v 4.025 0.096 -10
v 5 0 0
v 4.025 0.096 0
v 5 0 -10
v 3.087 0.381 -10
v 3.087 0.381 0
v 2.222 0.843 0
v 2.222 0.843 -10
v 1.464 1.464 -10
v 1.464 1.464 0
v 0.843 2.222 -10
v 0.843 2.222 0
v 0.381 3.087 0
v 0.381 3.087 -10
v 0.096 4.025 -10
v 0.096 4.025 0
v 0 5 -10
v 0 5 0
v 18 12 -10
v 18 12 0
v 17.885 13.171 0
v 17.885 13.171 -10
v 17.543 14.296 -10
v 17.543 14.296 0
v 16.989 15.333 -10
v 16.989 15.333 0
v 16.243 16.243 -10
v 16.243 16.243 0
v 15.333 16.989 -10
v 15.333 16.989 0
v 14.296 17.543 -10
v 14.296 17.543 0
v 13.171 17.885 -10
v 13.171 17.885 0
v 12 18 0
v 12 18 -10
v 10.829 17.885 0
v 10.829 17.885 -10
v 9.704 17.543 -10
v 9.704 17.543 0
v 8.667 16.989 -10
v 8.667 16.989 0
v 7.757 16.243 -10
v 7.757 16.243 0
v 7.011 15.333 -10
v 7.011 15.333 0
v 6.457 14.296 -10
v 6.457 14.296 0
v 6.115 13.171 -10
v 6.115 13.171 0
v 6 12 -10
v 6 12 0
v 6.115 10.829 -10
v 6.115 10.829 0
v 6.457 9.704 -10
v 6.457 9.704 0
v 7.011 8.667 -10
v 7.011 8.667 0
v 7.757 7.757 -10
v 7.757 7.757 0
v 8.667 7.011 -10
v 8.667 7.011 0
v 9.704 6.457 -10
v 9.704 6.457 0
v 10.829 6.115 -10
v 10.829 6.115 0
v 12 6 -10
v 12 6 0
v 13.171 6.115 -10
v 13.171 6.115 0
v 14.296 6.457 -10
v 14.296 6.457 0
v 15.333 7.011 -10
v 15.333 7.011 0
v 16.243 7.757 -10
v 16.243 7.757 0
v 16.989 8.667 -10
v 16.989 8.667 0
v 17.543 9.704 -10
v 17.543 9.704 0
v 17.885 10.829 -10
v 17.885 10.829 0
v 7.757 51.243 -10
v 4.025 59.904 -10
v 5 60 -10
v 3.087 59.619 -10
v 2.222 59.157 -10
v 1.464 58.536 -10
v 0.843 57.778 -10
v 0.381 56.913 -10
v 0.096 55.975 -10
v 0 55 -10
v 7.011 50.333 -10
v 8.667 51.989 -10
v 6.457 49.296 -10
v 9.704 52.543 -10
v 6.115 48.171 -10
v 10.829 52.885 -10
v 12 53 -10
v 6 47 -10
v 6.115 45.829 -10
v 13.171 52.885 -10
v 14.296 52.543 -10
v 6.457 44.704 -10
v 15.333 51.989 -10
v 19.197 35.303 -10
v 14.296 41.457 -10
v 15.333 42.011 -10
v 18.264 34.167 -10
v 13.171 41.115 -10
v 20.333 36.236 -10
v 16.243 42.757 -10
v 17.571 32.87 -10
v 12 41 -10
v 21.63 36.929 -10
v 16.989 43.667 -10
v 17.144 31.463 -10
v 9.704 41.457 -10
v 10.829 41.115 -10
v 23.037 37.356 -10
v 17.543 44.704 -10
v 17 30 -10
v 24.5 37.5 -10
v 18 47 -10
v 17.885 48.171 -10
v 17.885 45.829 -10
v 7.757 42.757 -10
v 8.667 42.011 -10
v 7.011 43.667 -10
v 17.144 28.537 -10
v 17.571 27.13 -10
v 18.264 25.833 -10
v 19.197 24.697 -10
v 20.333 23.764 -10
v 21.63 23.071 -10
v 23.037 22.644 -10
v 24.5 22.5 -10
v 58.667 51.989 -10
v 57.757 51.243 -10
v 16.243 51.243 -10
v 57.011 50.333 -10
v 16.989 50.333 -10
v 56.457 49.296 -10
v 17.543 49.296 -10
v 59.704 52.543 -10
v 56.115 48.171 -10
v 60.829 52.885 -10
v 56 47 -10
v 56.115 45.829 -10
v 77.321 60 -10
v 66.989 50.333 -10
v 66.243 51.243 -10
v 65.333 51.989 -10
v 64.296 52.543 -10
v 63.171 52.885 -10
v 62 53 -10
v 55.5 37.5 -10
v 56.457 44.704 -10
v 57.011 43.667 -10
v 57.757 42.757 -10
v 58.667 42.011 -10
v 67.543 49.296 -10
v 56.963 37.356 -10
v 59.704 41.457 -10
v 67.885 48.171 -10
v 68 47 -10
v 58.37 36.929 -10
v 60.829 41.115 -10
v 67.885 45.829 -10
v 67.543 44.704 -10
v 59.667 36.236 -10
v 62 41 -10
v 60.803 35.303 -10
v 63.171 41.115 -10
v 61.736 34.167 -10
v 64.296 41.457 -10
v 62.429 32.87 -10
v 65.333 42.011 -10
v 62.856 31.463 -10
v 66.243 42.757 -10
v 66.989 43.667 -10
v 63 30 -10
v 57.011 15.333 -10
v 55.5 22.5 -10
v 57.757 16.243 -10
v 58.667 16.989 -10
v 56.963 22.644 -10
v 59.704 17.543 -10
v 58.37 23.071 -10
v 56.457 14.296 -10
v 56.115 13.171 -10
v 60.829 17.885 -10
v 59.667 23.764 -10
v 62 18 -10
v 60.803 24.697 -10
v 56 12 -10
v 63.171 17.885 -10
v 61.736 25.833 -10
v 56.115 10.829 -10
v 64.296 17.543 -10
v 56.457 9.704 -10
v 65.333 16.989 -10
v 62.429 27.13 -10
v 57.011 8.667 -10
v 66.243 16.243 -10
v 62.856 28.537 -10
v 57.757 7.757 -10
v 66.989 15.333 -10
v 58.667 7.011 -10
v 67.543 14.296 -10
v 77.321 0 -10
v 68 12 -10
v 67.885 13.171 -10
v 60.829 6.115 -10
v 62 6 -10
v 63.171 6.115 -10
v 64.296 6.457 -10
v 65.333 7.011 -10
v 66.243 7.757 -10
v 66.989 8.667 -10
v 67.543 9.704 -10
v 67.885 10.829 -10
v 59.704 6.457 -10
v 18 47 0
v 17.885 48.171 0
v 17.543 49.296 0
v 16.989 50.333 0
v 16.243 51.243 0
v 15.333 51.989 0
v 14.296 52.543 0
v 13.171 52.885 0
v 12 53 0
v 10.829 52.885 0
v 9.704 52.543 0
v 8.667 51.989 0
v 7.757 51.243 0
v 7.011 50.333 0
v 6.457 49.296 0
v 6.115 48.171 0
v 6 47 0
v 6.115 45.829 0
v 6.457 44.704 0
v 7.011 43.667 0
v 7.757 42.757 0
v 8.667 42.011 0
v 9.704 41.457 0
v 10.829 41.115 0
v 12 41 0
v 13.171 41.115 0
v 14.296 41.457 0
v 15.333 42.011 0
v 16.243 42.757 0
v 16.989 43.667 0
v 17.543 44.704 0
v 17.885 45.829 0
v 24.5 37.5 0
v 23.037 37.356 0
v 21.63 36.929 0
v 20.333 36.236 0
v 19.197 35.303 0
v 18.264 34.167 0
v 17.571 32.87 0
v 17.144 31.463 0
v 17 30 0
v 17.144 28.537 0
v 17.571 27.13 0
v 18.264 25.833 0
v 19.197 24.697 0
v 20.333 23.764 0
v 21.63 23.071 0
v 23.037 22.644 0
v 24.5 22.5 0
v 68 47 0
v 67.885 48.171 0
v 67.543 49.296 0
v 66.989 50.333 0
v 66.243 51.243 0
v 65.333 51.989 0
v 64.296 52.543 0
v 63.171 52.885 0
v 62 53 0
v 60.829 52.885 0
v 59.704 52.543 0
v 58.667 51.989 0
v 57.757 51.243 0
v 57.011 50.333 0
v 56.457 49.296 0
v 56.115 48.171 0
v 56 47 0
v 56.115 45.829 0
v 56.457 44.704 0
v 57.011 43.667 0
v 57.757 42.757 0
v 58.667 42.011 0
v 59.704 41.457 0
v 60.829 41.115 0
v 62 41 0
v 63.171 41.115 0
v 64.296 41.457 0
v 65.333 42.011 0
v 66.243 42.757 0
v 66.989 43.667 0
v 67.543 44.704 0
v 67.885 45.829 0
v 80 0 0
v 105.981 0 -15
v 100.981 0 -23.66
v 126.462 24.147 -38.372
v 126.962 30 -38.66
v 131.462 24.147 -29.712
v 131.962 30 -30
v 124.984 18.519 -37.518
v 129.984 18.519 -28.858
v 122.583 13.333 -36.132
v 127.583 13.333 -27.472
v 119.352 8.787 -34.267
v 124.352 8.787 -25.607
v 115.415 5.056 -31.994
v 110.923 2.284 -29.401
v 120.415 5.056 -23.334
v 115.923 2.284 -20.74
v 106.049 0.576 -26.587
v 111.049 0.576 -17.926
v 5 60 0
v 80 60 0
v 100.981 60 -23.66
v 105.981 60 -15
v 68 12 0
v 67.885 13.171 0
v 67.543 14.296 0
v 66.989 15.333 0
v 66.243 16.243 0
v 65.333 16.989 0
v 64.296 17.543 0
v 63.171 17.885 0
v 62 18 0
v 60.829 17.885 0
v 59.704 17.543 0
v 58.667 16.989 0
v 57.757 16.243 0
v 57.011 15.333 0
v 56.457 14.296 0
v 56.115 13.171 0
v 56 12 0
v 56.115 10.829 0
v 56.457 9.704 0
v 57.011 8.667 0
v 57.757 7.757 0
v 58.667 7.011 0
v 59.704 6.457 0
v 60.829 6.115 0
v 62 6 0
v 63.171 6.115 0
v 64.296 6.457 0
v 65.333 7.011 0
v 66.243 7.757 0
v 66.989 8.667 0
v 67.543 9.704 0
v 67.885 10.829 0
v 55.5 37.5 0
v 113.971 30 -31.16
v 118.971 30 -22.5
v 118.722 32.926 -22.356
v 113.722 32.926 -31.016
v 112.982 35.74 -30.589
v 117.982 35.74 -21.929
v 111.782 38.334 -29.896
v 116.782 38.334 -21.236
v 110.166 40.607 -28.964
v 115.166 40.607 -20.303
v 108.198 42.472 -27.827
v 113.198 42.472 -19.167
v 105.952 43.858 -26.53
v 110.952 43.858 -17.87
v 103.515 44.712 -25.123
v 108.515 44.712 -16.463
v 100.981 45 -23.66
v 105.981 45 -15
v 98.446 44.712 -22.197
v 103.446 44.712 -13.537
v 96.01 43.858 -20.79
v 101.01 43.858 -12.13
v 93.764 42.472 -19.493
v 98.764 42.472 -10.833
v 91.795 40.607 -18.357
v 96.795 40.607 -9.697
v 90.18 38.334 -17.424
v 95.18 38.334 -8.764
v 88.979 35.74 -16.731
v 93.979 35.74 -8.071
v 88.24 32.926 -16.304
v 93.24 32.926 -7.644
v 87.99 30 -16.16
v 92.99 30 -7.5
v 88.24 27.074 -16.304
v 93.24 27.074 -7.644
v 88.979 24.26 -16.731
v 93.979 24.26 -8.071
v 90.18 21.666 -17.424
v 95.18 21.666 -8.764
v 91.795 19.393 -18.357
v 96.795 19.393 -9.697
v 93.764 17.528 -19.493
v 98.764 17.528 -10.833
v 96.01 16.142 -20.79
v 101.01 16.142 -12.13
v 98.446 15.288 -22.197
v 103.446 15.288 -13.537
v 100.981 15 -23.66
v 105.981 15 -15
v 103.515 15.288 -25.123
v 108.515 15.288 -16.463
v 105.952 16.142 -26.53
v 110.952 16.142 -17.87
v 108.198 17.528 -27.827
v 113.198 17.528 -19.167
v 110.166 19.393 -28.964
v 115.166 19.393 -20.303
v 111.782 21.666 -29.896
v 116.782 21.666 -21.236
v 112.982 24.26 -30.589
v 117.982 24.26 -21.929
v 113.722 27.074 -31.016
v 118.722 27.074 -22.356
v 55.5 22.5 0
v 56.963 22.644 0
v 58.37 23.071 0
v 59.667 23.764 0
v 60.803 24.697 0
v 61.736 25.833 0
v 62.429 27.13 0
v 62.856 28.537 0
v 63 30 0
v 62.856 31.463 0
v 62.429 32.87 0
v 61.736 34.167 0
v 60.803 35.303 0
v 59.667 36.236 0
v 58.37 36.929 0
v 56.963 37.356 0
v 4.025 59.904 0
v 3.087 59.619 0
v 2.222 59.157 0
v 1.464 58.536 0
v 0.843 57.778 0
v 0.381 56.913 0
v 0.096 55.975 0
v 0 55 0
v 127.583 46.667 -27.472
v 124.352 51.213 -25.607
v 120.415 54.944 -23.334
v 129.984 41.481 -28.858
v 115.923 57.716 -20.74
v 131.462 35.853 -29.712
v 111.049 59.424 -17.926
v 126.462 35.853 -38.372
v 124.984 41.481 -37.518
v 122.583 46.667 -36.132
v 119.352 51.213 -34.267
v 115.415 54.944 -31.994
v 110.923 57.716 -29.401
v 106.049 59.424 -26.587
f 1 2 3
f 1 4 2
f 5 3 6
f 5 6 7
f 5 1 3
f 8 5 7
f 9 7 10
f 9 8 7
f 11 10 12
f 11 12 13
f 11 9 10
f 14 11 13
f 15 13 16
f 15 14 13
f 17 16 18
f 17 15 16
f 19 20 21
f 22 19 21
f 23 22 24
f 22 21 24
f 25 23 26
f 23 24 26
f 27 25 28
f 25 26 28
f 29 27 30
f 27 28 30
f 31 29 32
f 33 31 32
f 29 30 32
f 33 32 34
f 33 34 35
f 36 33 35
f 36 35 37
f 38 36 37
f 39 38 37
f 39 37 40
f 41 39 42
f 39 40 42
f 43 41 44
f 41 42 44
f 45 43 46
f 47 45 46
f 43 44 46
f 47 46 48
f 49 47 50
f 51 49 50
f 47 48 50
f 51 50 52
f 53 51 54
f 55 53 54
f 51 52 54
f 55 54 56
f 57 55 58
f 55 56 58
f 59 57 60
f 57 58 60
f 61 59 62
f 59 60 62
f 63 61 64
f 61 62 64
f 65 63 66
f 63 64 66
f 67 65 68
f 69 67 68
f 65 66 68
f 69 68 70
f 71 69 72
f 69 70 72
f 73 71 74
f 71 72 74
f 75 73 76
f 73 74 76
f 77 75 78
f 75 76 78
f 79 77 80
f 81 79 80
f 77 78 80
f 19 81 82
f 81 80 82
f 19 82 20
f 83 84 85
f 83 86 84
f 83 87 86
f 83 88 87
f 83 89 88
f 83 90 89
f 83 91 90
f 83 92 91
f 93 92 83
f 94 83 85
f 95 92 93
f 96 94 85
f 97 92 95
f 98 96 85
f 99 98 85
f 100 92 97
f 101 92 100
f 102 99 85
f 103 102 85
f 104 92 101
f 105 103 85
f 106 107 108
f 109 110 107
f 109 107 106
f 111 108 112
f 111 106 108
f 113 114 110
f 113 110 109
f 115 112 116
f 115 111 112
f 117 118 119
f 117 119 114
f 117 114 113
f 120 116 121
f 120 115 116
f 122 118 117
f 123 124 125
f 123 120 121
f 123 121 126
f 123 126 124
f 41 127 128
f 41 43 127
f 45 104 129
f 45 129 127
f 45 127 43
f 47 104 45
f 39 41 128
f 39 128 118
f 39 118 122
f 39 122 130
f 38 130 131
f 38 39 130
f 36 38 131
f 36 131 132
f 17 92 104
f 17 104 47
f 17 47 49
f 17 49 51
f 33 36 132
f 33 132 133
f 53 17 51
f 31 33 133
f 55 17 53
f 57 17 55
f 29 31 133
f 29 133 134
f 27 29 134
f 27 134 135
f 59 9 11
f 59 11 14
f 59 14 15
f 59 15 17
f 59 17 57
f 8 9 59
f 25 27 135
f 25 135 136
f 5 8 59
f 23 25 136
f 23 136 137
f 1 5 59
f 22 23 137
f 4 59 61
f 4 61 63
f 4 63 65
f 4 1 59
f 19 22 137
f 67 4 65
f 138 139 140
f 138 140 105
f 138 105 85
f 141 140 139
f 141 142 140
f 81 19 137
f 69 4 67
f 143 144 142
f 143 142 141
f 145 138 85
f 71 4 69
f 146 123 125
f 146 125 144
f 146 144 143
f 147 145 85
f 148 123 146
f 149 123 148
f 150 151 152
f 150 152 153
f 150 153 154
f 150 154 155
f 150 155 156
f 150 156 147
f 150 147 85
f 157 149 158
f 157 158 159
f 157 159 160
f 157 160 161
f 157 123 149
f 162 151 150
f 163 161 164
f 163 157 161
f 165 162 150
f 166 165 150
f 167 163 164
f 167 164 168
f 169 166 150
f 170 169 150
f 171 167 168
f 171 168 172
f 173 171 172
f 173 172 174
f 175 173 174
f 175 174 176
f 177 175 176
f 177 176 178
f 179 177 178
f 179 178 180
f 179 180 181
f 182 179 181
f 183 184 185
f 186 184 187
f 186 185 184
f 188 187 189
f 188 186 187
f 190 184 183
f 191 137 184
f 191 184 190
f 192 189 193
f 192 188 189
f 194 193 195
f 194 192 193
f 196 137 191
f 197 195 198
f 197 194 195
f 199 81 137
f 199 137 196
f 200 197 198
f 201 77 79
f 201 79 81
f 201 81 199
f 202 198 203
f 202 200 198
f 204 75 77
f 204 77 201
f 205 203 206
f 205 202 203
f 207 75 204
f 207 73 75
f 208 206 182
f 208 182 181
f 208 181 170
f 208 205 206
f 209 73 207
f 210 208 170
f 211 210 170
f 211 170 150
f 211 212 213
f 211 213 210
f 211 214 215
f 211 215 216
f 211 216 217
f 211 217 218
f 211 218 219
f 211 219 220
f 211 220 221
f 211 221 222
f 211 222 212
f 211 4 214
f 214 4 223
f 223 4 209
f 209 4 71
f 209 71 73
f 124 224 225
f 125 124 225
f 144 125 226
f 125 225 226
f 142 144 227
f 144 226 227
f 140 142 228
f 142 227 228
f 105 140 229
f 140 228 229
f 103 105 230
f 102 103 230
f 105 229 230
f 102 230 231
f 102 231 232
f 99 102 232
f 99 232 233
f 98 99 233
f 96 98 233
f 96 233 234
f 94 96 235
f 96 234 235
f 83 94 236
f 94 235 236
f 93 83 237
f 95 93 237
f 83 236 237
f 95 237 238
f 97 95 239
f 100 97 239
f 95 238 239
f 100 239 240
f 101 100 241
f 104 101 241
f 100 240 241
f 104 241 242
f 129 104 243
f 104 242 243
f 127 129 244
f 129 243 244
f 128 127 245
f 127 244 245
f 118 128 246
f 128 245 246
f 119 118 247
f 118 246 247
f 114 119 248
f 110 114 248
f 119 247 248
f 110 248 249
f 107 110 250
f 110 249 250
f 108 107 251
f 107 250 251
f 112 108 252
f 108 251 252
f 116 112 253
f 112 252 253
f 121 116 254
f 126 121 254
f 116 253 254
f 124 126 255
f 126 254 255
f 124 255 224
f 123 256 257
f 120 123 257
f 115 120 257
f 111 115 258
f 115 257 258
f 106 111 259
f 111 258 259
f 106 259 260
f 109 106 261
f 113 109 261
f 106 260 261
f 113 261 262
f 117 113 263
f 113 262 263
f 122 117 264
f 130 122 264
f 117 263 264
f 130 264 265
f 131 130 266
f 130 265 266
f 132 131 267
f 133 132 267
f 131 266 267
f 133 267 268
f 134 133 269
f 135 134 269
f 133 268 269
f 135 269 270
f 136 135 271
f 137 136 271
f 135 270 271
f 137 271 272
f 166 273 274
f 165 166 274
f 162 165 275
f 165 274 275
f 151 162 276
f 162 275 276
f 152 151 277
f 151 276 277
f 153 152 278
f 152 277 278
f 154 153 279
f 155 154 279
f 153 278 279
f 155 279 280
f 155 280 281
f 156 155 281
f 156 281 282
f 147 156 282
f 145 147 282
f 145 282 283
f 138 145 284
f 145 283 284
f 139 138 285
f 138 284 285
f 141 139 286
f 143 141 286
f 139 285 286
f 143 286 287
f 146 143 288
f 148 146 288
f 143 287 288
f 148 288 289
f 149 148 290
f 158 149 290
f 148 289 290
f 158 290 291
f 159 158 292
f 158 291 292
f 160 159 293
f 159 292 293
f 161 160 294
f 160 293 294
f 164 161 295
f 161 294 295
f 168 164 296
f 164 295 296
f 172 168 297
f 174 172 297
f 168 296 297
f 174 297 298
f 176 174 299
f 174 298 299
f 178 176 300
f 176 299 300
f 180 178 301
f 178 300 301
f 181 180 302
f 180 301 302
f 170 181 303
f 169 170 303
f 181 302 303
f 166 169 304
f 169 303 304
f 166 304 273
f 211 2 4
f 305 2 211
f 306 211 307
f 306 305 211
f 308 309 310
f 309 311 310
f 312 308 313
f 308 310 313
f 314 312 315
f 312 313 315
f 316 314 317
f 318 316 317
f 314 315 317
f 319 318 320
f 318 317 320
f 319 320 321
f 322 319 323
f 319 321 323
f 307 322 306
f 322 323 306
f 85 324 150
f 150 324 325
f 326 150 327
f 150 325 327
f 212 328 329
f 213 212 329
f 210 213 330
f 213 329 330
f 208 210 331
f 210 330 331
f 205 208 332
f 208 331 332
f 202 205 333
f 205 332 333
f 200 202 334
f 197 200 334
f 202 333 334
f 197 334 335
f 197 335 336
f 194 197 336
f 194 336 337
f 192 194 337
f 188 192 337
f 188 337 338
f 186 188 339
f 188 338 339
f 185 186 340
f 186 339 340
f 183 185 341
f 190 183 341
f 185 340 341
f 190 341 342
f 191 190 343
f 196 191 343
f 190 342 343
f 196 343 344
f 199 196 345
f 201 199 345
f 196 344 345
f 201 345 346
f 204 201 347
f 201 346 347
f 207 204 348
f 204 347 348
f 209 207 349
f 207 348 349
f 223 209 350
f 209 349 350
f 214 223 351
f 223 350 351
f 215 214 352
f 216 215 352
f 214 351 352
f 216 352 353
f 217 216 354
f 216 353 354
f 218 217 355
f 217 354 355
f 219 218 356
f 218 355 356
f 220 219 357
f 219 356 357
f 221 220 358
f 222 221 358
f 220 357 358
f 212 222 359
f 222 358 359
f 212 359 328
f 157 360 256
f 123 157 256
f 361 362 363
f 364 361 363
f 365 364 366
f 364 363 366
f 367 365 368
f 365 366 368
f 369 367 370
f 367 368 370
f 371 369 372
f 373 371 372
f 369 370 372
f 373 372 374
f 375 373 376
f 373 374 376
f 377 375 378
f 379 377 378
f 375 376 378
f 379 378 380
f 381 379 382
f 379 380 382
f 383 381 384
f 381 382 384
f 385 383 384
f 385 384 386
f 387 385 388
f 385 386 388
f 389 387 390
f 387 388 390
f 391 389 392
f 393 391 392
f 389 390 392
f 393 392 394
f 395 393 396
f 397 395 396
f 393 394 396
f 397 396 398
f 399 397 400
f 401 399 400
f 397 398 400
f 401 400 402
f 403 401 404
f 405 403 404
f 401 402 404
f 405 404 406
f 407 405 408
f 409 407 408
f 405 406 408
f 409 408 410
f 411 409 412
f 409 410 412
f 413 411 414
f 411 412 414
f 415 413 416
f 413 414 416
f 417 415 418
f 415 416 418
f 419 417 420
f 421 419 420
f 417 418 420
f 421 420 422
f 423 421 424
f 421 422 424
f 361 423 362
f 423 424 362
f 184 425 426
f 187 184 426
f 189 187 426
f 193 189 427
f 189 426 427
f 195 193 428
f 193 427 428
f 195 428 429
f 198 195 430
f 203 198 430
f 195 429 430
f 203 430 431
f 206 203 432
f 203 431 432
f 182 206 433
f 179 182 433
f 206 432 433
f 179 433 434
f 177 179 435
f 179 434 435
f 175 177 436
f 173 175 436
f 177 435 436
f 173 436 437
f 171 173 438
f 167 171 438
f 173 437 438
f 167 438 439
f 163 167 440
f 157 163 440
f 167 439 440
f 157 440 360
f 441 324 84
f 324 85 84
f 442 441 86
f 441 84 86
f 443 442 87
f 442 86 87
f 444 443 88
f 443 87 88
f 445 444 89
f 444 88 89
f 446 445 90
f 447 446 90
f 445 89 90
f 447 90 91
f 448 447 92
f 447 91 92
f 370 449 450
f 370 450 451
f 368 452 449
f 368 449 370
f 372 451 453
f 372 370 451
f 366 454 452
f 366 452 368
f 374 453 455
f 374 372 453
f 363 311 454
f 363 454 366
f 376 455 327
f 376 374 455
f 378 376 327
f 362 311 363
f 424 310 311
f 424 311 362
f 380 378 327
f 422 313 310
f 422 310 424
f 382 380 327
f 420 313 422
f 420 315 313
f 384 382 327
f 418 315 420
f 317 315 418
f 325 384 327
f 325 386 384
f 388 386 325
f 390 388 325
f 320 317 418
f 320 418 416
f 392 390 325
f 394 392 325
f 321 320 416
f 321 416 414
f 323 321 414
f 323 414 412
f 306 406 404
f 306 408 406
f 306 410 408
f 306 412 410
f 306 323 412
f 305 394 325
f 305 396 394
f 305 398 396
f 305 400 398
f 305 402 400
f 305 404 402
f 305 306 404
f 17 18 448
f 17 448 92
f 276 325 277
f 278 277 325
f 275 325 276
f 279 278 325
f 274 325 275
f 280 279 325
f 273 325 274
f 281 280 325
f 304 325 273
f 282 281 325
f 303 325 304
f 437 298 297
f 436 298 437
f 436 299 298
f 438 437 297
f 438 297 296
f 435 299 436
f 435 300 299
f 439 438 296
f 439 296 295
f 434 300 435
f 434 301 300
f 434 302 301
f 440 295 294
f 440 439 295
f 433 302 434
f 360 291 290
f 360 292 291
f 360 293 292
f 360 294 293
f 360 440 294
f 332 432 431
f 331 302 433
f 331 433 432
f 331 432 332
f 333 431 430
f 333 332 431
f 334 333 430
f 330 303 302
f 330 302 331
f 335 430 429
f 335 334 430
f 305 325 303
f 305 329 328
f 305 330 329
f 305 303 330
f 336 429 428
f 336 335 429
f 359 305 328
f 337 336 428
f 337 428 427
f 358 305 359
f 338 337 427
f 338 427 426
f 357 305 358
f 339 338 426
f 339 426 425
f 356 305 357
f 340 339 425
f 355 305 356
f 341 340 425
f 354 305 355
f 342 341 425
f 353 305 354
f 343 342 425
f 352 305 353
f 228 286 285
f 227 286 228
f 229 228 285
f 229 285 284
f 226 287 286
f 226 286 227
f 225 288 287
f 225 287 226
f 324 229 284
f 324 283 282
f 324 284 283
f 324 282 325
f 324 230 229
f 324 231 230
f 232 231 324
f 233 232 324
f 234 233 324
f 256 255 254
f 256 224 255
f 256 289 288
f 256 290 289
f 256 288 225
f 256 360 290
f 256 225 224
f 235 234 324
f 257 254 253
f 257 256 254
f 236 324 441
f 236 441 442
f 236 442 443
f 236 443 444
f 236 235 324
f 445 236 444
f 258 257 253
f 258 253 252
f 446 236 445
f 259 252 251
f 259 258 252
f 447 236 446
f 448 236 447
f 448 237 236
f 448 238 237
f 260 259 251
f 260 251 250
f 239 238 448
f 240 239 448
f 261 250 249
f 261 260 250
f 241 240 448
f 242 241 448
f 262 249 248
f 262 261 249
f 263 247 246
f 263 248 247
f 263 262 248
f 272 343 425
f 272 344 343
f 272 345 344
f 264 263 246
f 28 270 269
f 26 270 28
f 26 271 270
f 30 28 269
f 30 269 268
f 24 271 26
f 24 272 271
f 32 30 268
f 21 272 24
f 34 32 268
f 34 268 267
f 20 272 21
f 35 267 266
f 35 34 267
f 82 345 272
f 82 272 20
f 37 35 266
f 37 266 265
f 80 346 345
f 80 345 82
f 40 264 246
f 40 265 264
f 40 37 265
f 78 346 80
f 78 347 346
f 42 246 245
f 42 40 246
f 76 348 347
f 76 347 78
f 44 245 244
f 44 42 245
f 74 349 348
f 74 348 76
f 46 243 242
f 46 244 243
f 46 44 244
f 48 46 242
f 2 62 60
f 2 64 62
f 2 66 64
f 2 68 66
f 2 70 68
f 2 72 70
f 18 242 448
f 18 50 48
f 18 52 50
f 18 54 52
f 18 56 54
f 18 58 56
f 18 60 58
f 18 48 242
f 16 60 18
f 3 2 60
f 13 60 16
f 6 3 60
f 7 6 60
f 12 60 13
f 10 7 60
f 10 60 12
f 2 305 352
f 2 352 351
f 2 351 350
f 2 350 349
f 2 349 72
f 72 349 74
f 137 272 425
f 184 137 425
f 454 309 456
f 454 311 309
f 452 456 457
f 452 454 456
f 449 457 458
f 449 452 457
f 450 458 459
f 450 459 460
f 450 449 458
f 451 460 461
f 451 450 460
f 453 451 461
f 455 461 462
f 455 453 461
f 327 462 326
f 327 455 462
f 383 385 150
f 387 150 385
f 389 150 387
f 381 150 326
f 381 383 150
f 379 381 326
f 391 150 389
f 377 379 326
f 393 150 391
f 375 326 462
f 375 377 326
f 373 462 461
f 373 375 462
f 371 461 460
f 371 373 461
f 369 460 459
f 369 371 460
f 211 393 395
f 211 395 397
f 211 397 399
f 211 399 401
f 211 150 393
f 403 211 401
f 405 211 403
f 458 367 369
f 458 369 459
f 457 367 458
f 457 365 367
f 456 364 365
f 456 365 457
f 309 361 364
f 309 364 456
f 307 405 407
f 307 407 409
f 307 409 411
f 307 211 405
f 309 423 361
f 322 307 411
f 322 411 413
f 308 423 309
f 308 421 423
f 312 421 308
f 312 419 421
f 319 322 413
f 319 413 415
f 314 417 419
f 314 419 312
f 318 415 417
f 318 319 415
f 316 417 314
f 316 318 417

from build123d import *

# Parameters (mm, degrees)
F1_DEPTH = 60
F2_R     = 29.99999
F3_R     = 15
F4_DEPTH = 10
F5_R     = 6
F6_DEPTH = 10
F8_DEPTH = 10
F9_R     = 5


# Not quite as in the source:
# - a fillet or chamfer is up to 0.001 mm smaller than in the source, because OpenCascade refuses the exact size


with BuildPart() as f1:
    # F0 (on Front) → F1 (new body)
    with BuildSketch(Plane.XZ):
        Polygon((80, 0), (0, 0), (0, -10), (77.3205080757, -10), (126.9615242271, -38.6602540378), (131.9615242271, -30), align=None)
    extrude(amount=-F1_DEPTH)

    # F2 (radius 30 in the source; OpenCascade refuses exactly that, so slightly less here)
    f2_edges = [f1.edges().sort_by_distance(p)[0] for p in [
        (129.461524, 0, -34.330127),
        (129.461524, 60, -34.330127),
    ]]
    fillet(f2_edges, radius=F2_R)

    # F3 (on face) → F4 (cut, through all)
    with BuildSketch(Plane(origin=(20, 0, 34.6410161514), x_dir=(0.8660254038, 0, -0.5), z_dir=(0.5, 0, 0.8660254038))):
        with Locations((99.2820323028, 30)):
            Circle(F3_R)
    extrude(amount=-F4_DEPTH, mode=Mode.SUBTRACT)

    # F5 (on face) → F6 (cut, through all)
    with BuildSketch(Plane.XY):
        with Locations((12, 12)):
            Circle(F5_R)
        with Locations((12, 47)):
            Circle(F5_R)
        with Locations((62, 12)):
            Circle(F5_R)
        with Locations((62, 47)):
            Circle(F5_R)
    extrude(amount=-F6_DEPTH, mode=Mode.SUBTRACT)

    # F7 (on face) → F8 (cut, through all)
    with BuildSketch(Plane.XY):
        with BuildLine():
            Line((24.5, 22.5), (55.5, 22.5))
            ThreePointArc((55.5, 22.5), (60.8033008589, 24.6966991411), (63, 30))
            ThreePointArc((63, 30), (60.8033008589, 35.3033008589), (55.5, 37.5))
            Line((55.5, 37.5), (24.5, 37.5))
            ThreePointArc((24.5, 37.5), (19.1966991411, 35.3033008589), (17, 30))
            ThreePointArc((17, 30), (19.1966991411, 24.6966991411), (24.5, 22.5))
        make_face()
    extrude(amount=-F8_DEPTH, mode=Mode.SUBTRACT)

    # F9
    f9_edges = [f1.edges().sort_by_distance(p)[0] for p in [
        (0, 0, -5),
        (0, 60, -5),
    ]]
    fillet(f9_edges, radius=F9_R)


solid = f1.part
